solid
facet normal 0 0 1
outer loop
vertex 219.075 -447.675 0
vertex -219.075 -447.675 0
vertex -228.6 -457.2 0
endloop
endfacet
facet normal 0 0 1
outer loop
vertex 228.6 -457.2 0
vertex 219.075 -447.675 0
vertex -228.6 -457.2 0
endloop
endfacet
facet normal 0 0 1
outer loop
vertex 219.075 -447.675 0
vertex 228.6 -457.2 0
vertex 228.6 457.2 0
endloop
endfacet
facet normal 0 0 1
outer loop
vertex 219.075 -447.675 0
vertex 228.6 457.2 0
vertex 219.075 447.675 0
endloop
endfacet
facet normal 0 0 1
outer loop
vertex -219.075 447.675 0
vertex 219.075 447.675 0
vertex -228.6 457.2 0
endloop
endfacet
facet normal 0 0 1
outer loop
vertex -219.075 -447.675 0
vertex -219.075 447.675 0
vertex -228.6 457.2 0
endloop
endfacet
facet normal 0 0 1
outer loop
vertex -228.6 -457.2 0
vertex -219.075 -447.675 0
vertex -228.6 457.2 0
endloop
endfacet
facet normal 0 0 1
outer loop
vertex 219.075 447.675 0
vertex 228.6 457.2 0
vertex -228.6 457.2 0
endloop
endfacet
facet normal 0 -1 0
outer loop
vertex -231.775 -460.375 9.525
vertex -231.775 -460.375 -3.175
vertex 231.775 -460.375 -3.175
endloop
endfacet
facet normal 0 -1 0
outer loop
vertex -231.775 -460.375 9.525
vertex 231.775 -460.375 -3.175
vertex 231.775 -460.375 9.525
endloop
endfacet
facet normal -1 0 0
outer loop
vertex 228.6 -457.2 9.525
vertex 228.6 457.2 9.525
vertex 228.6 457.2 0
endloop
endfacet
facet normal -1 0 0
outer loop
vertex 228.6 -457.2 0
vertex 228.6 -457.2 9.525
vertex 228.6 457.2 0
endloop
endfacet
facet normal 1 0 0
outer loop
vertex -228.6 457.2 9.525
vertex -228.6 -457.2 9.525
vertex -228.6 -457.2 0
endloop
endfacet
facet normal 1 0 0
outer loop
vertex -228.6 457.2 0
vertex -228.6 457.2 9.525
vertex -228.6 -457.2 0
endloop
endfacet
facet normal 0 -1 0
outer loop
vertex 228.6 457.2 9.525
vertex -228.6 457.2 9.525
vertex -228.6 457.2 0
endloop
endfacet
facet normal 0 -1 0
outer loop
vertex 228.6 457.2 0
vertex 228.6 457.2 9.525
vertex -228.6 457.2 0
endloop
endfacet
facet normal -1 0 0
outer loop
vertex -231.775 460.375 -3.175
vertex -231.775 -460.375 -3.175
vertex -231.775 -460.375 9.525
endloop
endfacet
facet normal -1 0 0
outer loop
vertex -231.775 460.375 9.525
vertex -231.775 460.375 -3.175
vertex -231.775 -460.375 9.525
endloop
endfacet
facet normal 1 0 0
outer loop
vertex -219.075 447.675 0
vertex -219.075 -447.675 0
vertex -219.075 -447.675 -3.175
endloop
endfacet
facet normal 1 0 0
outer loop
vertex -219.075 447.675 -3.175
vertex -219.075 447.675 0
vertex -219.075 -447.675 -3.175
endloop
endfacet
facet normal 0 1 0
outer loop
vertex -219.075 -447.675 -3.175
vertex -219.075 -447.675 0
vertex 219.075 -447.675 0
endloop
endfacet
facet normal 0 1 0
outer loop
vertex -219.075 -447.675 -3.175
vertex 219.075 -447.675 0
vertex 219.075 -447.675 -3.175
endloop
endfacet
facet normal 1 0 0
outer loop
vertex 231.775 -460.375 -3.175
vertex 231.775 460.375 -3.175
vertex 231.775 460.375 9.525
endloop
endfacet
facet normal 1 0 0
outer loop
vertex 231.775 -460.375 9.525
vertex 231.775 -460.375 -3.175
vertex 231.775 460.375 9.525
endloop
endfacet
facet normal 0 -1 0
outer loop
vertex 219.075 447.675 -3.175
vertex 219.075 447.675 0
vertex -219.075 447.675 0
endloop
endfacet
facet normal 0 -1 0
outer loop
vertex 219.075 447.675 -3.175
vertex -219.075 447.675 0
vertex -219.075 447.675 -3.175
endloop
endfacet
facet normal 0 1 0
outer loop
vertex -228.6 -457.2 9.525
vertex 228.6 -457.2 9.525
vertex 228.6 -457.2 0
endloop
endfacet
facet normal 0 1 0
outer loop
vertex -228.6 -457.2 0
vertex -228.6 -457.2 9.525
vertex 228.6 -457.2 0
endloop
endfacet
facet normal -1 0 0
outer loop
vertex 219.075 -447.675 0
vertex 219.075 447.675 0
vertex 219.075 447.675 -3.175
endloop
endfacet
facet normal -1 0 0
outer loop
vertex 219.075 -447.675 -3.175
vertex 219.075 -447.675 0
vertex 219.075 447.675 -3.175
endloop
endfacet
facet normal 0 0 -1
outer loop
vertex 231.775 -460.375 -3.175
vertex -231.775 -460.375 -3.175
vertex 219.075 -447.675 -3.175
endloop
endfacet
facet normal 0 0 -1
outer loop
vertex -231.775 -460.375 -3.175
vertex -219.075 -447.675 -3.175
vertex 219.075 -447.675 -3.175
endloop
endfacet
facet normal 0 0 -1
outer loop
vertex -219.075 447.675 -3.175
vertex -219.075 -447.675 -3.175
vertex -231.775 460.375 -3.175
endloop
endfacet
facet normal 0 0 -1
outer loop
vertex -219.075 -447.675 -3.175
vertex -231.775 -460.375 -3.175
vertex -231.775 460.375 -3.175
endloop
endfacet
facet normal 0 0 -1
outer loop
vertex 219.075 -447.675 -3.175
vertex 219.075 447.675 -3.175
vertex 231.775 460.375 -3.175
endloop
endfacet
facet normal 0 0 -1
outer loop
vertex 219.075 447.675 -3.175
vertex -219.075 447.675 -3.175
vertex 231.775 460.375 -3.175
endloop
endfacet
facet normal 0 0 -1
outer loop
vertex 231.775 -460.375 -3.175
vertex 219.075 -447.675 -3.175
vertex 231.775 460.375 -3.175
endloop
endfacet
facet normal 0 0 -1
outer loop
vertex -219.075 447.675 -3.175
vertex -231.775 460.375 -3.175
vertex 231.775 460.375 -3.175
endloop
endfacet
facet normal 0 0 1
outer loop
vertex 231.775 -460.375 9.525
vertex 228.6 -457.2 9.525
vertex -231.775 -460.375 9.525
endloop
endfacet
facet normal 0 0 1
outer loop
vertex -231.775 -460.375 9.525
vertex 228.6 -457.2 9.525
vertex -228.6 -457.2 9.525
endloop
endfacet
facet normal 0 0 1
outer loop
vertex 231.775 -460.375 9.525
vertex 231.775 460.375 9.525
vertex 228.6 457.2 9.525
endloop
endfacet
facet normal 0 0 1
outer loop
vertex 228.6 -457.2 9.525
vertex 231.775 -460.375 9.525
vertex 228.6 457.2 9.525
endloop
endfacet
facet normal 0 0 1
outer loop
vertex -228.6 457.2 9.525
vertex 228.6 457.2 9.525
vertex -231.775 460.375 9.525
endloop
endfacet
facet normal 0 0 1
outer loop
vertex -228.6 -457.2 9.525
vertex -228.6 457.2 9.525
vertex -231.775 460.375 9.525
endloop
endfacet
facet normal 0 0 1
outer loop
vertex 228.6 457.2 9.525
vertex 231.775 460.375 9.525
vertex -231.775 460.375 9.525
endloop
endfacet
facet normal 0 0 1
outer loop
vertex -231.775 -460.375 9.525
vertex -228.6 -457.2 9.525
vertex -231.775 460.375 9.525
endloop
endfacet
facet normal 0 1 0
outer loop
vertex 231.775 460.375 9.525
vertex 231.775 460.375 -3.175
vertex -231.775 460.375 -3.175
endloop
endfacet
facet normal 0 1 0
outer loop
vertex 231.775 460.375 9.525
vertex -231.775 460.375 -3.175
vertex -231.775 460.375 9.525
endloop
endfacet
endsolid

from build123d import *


with BuildPart() as f2:
    # F2: sweep along a path in F0
    with BuildLine(Plane.XY) as f2_path:
        Line((228.6, -457.2), (228.6, 457.2))
        Line((228.6, 457.2), (-228.6, 457.2))
        Line((-228.6, 457.2), (-228.6, -457.2))
        Line((-228.6, -457.2), (228.6, -457.2))
    # F1 (on Front) → F2 (sweep)
    with BuildSketch(Plane.XZ):
        Polygon((231.775, -3.175), (231.775, 9.525), (228.6, 9.525), (228.6, 0), (219.075, 0), (219.075, -3.175), align=None)
    sweep(path=f2_path.line, transition=Transition.RIGHT)


solid = f2.part
